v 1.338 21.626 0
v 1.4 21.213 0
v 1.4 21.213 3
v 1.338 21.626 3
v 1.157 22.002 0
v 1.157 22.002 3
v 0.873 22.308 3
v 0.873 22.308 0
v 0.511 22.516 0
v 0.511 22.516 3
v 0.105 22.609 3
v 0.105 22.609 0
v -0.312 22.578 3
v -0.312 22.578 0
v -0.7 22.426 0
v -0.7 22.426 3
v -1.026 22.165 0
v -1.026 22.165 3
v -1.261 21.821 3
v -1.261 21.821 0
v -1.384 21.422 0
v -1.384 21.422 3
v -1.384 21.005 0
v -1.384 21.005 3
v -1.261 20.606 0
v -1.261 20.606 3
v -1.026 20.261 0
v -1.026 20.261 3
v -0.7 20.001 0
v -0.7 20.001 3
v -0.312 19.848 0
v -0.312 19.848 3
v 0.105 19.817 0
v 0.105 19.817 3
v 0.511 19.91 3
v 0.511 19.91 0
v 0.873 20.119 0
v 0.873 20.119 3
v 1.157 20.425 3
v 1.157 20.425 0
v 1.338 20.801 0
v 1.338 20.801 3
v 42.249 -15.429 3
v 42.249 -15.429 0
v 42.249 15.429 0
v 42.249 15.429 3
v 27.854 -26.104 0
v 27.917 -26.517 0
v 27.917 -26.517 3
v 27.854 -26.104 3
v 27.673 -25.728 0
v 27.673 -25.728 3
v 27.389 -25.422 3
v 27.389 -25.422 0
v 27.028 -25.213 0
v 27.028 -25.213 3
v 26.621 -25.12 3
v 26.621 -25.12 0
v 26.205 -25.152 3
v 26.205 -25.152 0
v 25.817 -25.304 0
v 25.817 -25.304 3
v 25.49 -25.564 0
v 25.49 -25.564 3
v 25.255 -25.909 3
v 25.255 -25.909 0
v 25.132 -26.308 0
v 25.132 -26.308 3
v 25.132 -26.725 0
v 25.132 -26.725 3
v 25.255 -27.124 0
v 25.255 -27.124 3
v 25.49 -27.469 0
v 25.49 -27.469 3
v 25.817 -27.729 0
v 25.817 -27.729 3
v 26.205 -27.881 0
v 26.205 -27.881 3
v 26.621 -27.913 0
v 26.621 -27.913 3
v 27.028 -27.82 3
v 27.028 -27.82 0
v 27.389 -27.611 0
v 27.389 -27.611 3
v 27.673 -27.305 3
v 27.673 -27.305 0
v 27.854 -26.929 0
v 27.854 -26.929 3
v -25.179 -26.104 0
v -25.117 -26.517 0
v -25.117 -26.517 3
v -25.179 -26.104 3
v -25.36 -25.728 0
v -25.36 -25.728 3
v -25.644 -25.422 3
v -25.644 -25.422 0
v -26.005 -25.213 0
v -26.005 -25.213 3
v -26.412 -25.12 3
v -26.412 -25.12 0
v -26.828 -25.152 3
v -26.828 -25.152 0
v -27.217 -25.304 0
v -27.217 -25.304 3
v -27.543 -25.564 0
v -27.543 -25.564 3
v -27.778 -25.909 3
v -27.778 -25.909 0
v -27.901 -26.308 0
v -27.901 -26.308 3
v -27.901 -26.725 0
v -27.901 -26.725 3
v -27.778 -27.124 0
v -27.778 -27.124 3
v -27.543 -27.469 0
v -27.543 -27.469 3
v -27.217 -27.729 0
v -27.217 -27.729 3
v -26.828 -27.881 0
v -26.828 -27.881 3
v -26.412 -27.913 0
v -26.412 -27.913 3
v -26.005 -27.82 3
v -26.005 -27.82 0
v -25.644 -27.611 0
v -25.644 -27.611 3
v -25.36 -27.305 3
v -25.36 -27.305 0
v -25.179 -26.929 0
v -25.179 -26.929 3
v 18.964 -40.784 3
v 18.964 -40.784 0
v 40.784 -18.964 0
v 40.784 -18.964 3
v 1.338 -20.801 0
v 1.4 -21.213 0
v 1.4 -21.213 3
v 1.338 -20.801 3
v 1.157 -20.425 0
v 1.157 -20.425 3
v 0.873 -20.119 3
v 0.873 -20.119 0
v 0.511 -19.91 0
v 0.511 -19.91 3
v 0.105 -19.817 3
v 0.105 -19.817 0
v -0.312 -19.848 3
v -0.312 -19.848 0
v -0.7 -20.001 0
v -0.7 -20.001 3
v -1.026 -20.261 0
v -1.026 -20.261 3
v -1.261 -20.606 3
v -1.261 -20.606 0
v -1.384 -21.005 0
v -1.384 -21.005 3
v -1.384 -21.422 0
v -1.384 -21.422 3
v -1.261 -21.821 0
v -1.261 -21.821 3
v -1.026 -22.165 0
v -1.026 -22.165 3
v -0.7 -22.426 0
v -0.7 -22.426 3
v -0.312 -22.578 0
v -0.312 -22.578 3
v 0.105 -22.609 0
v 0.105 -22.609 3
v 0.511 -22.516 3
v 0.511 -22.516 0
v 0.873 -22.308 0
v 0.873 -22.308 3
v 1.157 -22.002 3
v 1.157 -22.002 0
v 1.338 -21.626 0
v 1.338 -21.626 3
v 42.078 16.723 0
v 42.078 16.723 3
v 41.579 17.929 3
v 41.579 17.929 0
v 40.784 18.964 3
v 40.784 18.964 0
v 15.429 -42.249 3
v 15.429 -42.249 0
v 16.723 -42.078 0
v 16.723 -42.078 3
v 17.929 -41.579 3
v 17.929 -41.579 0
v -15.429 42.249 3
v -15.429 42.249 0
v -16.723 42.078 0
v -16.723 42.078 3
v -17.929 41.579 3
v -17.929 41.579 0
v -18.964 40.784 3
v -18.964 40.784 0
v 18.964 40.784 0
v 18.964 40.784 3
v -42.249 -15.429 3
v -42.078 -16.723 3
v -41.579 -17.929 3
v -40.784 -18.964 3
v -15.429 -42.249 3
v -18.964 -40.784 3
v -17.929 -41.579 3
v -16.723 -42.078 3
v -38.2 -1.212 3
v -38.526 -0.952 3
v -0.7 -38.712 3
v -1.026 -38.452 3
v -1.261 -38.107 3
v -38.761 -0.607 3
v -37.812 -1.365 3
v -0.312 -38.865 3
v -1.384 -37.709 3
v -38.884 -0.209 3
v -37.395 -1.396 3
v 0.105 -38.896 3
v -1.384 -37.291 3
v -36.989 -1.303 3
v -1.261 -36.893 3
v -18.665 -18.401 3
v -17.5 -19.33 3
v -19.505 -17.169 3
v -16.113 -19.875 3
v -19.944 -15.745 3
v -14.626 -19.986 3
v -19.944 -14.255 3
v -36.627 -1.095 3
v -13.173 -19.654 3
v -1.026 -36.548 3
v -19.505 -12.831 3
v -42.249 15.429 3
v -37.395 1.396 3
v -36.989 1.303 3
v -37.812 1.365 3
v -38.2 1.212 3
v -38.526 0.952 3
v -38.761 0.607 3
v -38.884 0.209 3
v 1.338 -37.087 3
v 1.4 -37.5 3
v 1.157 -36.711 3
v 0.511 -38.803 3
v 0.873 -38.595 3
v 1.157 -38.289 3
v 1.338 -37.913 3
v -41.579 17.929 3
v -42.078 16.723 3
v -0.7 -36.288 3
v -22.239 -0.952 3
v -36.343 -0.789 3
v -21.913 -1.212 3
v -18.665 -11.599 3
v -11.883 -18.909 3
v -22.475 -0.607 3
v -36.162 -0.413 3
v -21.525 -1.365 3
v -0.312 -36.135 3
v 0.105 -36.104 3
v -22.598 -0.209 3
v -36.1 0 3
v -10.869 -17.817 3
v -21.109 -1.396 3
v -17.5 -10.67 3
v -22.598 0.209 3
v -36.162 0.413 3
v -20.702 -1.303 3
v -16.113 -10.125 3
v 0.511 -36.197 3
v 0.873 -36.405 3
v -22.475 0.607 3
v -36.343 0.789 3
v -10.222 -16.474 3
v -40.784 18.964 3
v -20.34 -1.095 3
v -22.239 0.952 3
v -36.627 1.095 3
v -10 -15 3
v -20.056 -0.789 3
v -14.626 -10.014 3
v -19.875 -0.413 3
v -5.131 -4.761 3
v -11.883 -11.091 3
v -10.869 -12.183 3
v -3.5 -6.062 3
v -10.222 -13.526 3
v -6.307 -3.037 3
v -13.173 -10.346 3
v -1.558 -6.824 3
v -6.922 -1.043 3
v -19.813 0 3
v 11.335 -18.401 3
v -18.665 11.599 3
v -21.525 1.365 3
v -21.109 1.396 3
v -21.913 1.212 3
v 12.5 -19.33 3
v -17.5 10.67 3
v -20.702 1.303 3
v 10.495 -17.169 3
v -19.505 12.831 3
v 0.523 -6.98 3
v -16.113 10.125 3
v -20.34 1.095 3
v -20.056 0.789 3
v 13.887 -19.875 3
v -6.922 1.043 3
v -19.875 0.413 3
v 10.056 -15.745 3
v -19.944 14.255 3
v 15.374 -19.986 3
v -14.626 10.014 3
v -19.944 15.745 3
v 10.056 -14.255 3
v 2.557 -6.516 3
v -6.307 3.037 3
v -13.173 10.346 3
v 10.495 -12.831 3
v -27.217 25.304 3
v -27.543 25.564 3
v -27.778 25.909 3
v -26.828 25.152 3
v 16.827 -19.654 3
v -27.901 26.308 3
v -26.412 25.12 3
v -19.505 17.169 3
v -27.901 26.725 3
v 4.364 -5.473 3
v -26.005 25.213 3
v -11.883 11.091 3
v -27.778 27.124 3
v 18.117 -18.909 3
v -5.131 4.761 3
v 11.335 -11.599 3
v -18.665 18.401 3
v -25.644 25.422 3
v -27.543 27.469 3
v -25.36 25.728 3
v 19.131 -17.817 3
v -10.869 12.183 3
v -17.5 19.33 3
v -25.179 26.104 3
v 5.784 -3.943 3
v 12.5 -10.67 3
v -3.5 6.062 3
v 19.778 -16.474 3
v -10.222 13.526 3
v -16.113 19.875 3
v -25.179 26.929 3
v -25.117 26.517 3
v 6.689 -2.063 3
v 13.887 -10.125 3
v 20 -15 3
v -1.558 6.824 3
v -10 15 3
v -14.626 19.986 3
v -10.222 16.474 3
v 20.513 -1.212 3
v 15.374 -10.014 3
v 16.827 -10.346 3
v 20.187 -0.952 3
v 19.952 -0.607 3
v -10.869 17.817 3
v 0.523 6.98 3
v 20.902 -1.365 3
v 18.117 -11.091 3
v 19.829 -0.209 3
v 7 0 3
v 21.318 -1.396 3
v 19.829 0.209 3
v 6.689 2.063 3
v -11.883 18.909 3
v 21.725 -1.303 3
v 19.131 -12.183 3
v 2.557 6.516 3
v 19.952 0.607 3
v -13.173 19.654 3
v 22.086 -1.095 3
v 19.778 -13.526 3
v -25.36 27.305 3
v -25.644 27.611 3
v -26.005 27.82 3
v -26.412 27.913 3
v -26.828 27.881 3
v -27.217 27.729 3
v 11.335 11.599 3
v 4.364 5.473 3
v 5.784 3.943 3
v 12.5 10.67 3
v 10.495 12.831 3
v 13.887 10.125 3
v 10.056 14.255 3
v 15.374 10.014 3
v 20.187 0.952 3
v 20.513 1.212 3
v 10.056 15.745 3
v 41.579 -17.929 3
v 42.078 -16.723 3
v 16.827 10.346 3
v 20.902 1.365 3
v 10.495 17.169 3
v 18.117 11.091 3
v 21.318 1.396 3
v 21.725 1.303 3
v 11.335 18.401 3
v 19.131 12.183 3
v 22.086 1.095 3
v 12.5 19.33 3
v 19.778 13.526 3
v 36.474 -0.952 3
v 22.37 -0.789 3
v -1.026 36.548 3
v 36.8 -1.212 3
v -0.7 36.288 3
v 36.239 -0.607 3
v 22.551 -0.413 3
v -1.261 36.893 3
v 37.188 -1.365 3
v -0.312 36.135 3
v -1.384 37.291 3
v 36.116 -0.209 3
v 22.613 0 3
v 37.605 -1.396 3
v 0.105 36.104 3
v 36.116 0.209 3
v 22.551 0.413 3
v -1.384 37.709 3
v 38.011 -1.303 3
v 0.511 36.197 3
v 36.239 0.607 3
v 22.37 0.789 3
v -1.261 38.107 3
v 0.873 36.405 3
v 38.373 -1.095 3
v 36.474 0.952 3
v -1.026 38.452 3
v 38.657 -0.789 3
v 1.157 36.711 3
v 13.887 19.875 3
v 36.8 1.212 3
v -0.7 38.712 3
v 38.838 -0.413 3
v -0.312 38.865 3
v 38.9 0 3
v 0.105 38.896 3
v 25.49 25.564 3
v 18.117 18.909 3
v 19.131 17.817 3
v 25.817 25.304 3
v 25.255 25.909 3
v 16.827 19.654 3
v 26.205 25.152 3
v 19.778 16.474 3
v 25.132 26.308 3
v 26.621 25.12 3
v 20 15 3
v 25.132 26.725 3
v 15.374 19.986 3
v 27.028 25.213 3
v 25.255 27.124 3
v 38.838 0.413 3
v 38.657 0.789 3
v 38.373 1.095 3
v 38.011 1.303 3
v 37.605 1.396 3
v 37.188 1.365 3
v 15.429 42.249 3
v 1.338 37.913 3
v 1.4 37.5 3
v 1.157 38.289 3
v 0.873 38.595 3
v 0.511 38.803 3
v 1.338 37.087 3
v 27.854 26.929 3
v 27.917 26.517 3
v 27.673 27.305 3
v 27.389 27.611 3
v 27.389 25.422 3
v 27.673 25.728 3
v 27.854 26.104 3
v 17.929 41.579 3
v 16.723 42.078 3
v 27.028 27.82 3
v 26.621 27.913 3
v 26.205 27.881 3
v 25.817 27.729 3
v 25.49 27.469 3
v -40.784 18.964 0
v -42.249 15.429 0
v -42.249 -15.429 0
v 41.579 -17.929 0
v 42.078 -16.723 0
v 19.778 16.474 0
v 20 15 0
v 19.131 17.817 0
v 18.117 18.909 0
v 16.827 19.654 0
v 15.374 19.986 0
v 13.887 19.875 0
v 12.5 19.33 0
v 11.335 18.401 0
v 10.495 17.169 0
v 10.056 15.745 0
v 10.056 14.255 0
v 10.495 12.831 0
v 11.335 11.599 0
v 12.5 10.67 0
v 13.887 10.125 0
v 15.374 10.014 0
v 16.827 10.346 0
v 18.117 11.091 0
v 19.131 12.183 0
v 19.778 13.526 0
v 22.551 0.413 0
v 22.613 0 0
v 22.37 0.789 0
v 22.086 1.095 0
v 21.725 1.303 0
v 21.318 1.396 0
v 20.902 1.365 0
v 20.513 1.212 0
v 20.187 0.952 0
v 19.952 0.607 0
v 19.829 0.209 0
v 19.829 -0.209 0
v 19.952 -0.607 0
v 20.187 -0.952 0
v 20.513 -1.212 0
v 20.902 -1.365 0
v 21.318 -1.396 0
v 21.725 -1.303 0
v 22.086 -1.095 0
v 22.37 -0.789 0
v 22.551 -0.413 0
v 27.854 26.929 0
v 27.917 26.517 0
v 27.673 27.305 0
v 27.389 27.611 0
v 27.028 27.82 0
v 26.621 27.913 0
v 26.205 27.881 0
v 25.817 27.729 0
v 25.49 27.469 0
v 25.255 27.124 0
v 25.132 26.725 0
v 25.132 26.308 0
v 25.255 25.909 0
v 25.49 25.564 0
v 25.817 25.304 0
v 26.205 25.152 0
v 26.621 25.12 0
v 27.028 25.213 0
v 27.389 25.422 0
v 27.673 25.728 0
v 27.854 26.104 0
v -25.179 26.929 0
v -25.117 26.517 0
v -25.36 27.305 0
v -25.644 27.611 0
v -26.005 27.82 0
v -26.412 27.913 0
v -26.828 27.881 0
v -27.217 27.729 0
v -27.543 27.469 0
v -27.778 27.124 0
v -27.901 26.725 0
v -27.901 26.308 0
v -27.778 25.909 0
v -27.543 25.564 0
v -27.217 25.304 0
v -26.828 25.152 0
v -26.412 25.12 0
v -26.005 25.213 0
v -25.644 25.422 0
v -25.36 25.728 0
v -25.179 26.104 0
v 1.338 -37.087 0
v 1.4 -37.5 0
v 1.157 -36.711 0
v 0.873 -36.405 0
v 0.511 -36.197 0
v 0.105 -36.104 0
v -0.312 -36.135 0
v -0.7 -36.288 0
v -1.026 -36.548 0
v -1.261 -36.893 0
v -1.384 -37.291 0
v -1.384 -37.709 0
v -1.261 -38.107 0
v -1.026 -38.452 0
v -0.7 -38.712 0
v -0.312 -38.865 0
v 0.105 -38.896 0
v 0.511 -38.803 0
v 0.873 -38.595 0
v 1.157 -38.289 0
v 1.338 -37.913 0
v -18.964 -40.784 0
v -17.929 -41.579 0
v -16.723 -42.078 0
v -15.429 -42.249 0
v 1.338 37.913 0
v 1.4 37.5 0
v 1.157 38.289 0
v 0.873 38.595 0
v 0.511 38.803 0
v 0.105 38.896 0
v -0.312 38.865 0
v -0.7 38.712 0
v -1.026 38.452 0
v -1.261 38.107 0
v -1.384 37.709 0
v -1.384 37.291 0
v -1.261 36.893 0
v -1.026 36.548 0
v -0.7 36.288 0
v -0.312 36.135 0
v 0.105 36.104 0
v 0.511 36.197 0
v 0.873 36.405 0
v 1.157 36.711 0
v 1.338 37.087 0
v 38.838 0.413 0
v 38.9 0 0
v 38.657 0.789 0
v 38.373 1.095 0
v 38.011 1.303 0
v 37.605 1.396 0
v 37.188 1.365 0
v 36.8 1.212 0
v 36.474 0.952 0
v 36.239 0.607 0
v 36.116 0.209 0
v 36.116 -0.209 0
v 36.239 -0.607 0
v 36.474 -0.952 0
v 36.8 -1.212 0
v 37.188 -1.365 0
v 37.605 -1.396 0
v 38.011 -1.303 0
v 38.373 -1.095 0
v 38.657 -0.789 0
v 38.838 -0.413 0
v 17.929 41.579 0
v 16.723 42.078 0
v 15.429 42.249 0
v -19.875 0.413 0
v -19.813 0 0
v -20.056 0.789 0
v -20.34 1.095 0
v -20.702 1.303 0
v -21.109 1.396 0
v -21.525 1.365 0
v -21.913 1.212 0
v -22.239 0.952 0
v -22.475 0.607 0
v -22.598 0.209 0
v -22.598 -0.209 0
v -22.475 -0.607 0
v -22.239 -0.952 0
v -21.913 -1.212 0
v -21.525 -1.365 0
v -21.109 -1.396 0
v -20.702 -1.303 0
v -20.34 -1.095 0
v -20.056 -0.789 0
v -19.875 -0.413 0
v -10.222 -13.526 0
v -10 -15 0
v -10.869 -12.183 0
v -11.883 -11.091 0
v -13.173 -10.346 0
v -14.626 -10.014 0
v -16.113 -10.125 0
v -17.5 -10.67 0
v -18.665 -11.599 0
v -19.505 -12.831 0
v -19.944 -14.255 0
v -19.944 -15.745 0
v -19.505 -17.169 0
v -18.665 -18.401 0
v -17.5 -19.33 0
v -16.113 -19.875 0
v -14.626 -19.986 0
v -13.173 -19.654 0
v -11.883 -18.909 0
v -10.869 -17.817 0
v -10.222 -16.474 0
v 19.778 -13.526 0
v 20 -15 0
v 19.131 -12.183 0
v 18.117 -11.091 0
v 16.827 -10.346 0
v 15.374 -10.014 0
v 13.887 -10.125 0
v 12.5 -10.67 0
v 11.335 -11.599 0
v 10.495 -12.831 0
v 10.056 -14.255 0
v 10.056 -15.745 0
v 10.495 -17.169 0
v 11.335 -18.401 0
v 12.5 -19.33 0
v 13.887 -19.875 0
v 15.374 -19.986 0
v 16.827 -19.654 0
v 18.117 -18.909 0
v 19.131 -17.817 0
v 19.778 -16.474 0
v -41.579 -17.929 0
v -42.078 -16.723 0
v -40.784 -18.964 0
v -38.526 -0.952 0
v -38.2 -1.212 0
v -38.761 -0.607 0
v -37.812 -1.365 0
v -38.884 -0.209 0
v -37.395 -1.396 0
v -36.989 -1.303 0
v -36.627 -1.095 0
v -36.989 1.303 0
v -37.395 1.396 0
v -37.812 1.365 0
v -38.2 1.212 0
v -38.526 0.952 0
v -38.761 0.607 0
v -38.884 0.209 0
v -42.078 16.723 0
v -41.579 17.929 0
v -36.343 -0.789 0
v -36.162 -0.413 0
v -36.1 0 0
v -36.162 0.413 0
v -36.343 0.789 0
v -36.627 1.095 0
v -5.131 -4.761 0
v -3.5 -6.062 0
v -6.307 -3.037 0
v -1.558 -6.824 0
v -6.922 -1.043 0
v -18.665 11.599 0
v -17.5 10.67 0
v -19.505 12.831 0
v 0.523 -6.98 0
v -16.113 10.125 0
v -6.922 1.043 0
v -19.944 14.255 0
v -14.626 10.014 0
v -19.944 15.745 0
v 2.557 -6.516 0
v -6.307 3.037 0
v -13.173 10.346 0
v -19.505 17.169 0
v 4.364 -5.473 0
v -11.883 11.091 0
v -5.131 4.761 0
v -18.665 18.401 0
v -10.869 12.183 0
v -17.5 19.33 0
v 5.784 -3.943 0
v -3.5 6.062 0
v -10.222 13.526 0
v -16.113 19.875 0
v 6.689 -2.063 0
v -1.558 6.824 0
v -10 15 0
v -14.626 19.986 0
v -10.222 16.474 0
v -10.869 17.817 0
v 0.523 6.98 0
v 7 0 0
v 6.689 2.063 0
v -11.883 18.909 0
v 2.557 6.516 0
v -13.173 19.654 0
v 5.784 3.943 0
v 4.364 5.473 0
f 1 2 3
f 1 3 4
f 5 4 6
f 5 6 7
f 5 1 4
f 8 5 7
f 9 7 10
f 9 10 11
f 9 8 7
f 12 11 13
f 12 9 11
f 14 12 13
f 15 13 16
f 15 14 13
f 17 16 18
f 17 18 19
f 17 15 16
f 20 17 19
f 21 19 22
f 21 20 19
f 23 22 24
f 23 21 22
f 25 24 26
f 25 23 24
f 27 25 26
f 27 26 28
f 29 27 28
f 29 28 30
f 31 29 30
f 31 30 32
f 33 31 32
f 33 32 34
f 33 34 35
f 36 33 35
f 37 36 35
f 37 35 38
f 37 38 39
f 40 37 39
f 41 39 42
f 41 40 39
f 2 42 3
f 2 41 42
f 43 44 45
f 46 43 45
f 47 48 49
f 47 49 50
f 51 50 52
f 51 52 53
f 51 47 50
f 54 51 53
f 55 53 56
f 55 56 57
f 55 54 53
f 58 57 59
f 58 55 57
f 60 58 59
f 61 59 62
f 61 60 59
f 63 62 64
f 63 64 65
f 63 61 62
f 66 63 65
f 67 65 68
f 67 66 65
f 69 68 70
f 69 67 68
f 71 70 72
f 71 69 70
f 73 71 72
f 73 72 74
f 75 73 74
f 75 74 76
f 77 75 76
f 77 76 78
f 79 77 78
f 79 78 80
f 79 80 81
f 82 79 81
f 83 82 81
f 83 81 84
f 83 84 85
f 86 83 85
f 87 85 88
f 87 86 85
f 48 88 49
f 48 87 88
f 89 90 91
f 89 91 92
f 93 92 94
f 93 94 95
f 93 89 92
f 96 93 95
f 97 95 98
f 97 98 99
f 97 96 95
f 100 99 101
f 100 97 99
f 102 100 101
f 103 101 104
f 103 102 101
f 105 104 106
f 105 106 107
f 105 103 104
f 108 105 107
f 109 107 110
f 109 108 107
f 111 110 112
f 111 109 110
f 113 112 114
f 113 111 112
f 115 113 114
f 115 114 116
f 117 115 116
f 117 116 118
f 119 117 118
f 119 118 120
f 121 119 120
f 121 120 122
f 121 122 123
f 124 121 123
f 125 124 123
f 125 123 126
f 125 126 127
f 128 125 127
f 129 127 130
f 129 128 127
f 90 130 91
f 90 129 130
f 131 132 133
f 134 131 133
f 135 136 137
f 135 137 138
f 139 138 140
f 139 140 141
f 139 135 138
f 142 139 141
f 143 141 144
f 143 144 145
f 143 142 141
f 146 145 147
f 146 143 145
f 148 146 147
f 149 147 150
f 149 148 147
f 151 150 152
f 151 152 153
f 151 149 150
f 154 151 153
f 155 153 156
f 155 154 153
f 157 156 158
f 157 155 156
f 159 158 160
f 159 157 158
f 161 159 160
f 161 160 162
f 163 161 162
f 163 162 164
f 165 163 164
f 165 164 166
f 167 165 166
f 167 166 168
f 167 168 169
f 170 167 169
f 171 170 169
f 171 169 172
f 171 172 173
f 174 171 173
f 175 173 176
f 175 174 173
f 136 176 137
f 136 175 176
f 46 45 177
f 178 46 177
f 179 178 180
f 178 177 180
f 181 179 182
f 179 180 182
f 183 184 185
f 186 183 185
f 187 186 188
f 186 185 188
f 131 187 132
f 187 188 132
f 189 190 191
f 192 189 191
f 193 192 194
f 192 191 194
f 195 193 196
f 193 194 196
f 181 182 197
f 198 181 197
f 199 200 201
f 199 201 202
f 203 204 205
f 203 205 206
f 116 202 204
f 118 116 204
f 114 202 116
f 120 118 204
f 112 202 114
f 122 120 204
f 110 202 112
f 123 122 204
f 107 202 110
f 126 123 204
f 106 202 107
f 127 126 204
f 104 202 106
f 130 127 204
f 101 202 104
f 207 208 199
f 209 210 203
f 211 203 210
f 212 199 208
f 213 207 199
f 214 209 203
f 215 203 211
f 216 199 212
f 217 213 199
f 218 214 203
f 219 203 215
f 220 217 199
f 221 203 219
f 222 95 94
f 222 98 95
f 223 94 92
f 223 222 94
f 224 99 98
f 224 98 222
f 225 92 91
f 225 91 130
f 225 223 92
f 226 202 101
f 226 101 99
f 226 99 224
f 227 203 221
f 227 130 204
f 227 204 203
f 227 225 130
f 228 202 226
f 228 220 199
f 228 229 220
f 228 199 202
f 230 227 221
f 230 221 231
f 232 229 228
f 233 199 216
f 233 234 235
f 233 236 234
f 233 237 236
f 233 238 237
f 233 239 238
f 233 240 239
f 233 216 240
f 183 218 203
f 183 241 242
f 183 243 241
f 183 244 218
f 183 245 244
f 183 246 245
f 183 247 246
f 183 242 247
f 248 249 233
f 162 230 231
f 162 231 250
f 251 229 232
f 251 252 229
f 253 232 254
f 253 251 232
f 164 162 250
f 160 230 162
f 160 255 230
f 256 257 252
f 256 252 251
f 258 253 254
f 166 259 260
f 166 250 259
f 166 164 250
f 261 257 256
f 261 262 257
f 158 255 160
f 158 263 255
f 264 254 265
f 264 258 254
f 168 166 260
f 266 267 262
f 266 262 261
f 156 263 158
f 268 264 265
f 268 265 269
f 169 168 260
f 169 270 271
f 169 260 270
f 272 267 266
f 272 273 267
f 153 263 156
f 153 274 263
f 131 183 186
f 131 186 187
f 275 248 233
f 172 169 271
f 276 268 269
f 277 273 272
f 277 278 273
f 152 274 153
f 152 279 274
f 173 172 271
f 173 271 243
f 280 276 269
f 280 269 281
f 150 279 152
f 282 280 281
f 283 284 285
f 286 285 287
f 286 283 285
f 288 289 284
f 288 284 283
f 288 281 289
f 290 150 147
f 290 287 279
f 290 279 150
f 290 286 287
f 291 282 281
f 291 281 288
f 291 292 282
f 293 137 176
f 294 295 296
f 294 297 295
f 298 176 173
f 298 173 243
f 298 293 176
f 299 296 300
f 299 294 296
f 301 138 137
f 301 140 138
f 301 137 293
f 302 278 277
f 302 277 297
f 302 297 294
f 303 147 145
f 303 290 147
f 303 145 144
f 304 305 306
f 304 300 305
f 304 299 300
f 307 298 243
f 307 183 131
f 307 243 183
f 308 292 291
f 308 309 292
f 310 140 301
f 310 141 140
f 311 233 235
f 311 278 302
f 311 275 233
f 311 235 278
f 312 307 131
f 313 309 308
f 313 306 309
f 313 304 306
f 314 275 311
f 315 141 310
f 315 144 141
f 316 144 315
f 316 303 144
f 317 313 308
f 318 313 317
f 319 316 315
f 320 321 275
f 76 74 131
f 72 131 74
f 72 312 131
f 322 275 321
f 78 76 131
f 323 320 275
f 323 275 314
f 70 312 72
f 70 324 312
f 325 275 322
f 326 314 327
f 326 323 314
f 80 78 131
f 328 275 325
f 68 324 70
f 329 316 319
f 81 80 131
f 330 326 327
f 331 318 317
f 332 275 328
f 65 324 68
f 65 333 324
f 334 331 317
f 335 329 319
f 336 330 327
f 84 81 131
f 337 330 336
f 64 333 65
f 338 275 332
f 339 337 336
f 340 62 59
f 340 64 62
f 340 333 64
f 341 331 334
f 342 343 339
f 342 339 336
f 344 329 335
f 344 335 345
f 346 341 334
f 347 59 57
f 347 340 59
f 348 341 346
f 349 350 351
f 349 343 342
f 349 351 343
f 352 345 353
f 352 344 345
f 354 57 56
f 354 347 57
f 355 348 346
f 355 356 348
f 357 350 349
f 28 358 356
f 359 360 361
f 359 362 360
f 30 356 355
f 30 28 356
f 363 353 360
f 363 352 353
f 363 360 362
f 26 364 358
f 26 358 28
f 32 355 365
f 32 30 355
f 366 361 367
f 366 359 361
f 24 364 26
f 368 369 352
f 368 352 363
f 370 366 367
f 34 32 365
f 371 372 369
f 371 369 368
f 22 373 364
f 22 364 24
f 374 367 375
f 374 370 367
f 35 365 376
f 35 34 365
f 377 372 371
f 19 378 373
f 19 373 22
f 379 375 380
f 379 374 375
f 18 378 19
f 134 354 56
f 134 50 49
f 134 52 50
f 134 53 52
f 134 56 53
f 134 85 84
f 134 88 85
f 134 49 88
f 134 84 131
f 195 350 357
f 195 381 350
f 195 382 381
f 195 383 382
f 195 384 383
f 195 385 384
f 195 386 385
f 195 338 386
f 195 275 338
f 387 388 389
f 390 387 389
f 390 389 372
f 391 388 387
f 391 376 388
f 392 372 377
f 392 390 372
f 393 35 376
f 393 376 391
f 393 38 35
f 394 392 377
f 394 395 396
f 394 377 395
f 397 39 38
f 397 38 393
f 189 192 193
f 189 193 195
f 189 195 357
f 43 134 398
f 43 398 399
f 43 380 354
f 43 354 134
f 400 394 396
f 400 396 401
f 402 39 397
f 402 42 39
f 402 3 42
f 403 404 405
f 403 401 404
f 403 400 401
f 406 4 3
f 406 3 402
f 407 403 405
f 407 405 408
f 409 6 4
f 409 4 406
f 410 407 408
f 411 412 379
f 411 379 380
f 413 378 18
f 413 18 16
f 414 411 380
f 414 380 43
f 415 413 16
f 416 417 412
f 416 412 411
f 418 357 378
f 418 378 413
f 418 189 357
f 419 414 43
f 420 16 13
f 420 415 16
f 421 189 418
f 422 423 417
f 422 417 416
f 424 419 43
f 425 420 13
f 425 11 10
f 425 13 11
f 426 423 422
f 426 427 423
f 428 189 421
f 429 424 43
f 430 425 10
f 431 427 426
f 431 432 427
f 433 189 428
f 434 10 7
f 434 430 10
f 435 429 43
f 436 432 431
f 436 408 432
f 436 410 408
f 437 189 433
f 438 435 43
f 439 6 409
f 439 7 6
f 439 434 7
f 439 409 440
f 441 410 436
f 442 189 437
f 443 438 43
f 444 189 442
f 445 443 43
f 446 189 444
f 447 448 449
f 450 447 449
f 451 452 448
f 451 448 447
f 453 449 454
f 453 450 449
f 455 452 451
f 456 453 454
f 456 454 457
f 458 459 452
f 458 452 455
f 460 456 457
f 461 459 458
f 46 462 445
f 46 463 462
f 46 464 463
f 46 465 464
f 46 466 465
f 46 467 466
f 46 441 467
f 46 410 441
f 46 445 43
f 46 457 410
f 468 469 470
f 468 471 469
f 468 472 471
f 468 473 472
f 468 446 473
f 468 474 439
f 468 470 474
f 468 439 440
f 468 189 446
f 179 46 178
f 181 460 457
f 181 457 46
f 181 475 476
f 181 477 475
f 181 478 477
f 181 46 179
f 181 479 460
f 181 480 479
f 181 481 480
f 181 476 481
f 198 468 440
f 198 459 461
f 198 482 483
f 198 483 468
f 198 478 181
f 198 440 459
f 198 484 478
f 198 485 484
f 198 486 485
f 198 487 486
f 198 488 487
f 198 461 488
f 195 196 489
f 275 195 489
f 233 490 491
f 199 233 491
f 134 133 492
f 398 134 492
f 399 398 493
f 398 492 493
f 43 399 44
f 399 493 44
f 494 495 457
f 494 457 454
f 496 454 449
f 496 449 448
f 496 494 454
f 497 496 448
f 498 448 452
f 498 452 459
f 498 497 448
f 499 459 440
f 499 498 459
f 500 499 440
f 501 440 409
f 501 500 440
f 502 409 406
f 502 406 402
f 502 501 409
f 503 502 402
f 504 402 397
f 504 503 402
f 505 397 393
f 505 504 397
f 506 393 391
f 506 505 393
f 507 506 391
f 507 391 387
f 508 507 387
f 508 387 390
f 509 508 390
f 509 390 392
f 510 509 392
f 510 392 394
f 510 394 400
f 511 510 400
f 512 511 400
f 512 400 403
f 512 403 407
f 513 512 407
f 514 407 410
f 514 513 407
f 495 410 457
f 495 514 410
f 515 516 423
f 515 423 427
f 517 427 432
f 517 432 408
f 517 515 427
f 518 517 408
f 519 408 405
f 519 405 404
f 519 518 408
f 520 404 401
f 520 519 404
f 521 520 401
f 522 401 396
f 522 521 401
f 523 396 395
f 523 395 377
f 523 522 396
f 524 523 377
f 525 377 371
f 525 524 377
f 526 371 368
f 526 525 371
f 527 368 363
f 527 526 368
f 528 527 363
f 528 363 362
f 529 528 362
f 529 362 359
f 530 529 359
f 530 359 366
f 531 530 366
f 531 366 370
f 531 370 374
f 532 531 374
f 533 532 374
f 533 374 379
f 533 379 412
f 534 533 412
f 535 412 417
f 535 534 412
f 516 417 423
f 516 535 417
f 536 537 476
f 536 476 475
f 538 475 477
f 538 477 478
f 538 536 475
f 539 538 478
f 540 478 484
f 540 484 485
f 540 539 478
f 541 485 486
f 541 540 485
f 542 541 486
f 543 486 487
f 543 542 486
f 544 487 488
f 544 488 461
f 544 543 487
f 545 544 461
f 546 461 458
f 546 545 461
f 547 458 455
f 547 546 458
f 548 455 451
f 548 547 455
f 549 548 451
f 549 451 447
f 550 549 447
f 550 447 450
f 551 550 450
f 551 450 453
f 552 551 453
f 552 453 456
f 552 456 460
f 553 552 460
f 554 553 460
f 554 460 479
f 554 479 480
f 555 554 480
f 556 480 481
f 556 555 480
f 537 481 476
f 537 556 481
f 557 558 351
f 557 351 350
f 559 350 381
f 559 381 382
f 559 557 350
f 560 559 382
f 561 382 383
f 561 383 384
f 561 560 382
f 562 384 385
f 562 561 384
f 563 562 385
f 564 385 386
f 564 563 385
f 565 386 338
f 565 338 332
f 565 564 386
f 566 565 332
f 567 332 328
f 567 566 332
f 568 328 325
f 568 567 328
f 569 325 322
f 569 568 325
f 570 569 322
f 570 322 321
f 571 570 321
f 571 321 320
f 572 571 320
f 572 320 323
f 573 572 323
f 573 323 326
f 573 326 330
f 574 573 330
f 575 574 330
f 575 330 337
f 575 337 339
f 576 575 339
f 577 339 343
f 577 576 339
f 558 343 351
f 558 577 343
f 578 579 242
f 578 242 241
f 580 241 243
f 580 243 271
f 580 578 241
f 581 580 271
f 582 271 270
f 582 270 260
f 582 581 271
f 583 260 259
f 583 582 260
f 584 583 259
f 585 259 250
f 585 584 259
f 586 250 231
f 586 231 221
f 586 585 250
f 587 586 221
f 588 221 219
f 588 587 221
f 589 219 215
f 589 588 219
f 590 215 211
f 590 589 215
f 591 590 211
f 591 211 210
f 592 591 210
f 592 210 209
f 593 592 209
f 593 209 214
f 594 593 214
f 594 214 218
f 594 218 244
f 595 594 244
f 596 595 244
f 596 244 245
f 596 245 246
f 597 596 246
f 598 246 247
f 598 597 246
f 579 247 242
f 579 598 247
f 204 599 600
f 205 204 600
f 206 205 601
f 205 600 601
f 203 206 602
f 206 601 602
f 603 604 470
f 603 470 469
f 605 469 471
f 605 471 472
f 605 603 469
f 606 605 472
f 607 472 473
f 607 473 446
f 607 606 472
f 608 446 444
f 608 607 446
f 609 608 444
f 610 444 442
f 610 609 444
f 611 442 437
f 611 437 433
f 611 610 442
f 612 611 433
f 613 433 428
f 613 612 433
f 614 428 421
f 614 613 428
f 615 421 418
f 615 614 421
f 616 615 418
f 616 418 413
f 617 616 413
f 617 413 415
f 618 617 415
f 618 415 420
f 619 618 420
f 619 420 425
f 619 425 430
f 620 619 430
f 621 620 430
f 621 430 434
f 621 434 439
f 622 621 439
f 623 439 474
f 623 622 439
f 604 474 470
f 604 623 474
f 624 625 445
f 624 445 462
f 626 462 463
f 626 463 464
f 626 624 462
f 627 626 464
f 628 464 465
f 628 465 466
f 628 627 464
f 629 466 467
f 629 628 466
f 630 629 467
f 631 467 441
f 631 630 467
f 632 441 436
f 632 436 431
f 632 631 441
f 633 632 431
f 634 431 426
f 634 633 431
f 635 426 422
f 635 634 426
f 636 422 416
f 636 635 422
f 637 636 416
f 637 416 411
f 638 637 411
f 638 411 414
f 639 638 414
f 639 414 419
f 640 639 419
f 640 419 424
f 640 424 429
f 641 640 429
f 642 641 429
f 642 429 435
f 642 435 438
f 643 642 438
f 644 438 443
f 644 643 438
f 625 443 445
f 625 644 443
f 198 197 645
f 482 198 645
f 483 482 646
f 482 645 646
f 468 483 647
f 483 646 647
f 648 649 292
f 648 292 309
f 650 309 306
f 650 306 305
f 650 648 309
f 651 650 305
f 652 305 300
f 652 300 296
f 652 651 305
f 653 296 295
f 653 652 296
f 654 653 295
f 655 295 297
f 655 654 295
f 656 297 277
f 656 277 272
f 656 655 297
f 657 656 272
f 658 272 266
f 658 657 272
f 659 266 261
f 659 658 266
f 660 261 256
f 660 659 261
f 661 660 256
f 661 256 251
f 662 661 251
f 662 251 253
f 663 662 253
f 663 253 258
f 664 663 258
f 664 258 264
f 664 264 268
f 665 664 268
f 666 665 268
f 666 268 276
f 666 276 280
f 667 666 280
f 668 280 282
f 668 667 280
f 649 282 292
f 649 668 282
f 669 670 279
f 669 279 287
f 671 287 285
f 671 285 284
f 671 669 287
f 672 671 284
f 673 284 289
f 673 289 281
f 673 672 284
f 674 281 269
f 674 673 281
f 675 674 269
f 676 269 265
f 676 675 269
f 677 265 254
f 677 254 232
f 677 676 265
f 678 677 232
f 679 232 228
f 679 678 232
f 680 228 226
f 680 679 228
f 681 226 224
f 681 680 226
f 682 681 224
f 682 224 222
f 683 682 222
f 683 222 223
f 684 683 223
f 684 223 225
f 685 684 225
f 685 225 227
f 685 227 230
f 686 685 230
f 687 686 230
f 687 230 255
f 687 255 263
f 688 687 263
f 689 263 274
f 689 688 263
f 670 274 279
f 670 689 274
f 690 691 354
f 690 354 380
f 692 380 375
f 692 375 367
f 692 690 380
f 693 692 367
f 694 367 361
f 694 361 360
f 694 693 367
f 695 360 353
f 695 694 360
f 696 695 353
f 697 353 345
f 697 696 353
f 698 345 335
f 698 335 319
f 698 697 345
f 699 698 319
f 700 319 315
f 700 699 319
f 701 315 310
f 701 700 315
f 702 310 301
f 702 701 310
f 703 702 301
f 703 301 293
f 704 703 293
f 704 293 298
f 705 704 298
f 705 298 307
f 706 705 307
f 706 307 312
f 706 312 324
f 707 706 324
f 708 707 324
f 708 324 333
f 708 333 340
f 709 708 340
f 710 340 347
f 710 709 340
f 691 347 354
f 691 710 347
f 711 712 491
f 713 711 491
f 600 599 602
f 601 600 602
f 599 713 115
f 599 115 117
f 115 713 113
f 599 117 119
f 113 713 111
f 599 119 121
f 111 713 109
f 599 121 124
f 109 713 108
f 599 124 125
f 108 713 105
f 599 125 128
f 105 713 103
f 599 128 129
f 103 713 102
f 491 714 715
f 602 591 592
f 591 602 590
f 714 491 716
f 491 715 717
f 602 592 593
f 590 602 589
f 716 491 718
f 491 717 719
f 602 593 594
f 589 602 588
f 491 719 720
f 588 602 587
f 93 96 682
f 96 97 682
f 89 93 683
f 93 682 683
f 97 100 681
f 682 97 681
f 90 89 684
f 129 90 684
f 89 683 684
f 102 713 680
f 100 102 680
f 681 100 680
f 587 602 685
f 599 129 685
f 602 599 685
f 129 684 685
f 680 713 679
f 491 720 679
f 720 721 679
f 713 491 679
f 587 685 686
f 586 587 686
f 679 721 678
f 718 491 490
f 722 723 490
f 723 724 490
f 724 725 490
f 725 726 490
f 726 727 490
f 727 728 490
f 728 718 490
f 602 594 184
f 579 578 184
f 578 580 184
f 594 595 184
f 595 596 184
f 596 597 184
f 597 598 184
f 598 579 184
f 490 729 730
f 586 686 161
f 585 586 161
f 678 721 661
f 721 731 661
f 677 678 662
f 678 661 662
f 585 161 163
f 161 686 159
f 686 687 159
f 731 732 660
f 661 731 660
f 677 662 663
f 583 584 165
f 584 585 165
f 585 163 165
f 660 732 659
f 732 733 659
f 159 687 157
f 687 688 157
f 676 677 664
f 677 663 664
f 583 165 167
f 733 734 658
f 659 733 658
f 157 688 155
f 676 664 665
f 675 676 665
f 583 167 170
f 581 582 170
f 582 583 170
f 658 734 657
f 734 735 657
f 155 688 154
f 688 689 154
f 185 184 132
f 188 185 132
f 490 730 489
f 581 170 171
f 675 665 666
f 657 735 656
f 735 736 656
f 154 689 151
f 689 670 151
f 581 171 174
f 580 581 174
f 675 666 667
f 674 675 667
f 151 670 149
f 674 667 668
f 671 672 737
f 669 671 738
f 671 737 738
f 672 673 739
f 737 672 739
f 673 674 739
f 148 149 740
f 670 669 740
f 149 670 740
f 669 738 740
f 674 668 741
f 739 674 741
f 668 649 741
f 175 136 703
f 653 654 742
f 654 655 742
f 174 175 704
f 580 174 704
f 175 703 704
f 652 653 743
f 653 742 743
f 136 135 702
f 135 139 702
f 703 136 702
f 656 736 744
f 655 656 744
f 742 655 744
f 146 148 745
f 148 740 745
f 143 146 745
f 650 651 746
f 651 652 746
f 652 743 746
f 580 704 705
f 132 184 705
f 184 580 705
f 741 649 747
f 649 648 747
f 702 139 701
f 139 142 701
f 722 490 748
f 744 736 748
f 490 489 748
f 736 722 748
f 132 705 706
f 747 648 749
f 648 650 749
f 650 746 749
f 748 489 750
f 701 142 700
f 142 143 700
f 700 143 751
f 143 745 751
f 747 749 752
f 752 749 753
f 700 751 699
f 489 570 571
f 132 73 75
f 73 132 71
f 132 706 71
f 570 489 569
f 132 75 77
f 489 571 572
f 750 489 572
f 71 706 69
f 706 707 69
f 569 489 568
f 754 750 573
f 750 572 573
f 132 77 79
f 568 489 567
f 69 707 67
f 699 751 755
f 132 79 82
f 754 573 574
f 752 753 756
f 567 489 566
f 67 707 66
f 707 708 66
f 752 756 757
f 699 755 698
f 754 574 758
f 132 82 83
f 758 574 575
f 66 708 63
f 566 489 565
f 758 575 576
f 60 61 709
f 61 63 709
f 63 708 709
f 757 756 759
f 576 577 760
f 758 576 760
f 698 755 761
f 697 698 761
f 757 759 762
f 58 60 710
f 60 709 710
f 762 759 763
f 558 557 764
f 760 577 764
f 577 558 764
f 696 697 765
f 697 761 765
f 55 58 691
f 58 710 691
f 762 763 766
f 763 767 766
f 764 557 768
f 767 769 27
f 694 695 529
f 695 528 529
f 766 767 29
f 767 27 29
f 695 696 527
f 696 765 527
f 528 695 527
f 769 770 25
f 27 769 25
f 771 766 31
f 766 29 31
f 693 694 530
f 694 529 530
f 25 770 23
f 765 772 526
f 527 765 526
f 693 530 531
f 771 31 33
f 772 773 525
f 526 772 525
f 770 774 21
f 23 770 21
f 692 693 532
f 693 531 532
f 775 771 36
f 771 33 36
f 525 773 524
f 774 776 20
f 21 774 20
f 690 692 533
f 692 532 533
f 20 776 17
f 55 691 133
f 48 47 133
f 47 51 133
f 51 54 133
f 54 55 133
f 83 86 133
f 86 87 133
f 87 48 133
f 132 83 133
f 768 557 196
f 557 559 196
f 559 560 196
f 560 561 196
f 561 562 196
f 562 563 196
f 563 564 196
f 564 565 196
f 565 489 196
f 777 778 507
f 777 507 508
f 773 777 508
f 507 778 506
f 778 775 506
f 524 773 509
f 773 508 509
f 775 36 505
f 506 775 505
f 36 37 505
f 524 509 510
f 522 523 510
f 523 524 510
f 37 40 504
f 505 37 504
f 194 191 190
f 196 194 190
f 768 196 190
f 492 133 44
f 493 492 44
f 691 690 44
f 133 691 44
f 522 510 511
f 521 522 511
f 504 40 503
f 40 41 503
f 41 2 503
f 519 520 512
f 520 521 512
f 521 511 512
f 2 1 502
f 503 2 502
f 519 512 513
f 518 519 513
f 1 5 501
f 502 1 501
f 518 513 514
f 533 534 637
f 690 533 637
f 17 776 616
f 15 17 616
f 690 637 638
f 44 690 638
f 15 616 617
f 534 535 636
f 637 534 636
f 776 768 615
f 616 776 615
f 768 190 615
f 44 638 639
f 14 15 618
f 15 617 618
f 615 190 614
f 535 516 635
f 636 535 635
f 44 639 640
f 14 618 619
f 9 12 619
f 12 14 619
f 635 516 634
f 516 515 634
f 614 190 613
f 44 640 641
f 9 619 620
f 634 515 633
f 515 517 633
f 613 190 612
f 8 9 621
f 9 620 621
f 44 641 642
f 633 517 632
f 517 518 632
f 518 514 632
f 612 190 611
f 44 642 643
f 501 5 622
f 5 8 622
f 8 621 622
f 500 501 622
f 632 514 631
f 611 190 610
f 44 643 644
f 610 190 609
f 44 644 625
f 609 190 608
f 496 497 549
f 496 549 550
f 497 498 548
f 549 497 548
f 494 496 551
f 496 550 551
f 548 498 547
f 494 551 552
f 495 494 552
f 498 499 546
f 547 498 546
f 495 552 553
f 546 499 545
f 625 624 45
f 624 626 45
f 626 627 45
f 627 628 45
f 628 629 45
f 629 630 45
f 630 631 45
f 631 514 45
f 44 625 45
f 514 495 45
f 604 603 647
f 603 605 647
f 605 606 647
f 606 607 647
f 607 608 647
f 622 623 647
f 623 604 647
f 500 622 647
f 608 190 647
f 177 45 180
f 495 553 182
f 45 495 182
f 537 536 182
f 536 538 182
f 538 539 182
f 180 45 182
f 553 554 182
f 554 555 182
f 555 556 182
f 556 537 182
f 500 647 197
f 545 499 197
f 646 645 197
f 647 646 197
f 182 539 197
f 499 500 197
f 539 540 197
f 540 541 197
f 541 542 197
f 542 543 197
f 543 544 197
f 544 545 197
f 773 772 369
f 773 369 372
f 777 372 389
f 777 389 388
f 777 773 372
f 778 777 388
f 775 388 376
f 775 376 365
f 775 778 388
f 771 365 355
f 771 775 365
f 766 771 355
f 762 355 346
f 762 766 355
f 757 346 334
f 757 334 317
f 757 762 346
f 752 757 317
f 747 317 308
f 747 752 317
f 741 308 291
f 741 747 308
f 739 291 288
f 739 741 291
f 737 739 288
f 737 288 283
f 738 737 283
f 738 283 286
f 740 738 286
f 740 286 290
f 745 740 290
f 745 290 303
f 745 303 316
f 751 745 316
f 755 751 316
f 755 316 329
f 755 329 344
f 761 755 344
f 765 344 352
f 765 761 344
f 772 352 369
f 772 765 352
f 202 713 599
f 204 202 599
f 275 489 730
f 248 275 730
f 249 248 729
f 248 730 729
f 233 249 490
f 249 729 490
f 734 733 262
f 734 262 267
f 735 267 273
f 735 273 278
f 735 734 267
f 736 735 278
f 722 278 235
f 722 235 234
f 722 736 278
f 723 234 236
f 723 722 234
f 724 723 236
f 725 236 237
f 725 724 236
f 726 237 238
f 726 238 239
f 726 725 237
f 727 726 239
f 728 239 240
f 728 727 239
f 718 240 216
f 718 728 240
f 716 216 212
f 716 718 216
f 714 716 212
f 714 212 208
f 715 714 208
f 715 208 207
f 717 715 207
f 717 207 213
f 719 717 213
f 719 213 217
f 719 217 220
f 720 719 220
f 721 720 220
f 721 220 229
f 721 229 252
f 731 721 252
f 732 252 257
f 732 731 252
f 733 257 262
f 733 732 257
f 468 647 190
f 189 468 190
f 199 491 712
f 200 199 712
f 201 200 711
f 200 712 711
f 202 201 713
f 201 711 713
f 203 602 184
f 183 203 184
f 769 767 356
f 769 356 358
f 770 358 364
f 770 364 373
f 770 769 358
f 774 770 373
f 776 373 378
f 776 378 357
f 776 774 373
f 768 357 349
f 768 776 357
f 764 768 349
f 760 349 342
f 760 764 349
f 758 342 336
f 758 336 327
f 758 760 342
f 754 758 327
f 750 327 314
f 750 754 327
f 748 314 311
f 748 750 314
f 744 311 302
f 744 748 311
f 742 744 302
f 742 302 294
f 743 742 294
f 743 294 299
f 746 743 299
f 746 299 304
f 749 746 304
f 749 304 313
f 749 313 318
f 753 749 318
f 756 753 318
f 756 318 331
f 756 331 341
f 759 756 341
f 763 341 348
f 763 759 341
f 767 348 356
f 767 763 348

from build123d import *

# Parameters (mm, degrees)
F0_R     = 1.4
F0_R_2   = 5
F0_R_3   = 7
F1_DEPTH = 3


with BuildPart() as f1:
    # F0 (on Top) → F1 (new body)
    with BuildSketch(Plane.XY):
        with BuildLine():
            Line((15.428932, 42.248737), (-15.428932, 42.248737))
            ThreePointArc((-15.428932, 42.248737), (-17.342349, 41.868135), (-18.964466, 40.784271))
            Line((-18.964466, 40.784271), (-40.784271, 18.964466))
            ThreePointArc((-40.784271, 18.964466), (-41.868135, 17.342349), (-42.248737, 15.428932))
            Line((-42.248737, 15.428932), (-42.248737, -15.428932))
            ThreePointArc((-42.248737, -15.428932), (-41.868135, -17.342349), (-40.784271, -18.964466))
            Line((-40.784271, -18.964466), (-18.964466, -40.784271))
            ThreePointArc((-18.964466, -40.784271), (-17.342349, -41.868135), (-15.428932, -42.248737))
            Line((-15.428932, -42.248737), (15.428932, -42.248737))
            ThreePointArc((15.428932, -42.248737), (17.342349, -41.868135), (18.964466, -40.784271))
            Line((18.964466, -40.784271), (40.784271, -18.964466))
            ThreePointArc((40.784271, -18.964466), (41.868135, -17.342349), (42.248737, -15.428932))
            Line((42.248737, -15.428932), (42.248737, 15.428932))
            ThreePointArc((42.248737, 15.428932), (41.868135, 17.342349), (40.784271, 18.964466))
            Line((40.784271, 18.964466), (18.964466, 40.784271))
            ThreePointArc((18.964466, 40.784271), (17.342349, 41.868135), (15.428932, 42.248737))
        make_face()
        with Locations((-26.516504, -26.516504)):
            Circle(F0_R, mode=Mode.SUBTRACT)
        with Locations((0, -37.5)):
            Circle(F0_R, mode=Mode.SUBTRACT)
        with Locations((0, -21.213203)):
            Circle(F0_R, mode=Mode.SUBTRACT)
        with Locations((-37.5, 0)):
            Circle(F0_R, mode=Mode.SUBTRACT)
        with Locations((-21.213203, 0)):
            Circle(F0_R, mode=Mode.SUBTRACT)
        with Locations((-15, -15)):
            Circle(F0_R_2, mode=Mode.SUBTRACT)
        Circle(F0_R_3, mode=Mode.SUBTRACT)
        with Locations((26.516504, -26.516504)):
            Circle(F0_R, mode=Mode.SUBTRACT)
        with Locations((15, -15)):
            Circle(F0_R_2, mode=Mode.SUBTRACT)
        with Locations((21.213203, 0)):
            Circle(F0_R, mode=Mode.SUBTRACT)
        with Locations((37.5, 0)):
            Circle(F0_R, mode=Mode.SUBTRACT)
        with Locations((-15, 15)):
            Circle(F0_R_2, mode=Mode.SUBTRACT)
        with Locations((-26.516504, 26.516504)):
            Circle(F0_R, mode=Mode.SUBTRACT)
        with Locations((0, 21.213203)):
            Circle(F0_R, mode=Mode.SUBTRACT)
        with Locations((0, 37.5)):
            Circle(F0_R, mode=Mode.SUBTRACT)
        with Locations((15, 15)):
            Circle(F0_R_2, mode=Mode.SUBTRACT)
        with Locations((26.516504, 26.516504)):
            Circle(F0_R, mode=Mode.SUBTRACT)
    extrude(amount=F1_DEPTH)


solid = f1.part
